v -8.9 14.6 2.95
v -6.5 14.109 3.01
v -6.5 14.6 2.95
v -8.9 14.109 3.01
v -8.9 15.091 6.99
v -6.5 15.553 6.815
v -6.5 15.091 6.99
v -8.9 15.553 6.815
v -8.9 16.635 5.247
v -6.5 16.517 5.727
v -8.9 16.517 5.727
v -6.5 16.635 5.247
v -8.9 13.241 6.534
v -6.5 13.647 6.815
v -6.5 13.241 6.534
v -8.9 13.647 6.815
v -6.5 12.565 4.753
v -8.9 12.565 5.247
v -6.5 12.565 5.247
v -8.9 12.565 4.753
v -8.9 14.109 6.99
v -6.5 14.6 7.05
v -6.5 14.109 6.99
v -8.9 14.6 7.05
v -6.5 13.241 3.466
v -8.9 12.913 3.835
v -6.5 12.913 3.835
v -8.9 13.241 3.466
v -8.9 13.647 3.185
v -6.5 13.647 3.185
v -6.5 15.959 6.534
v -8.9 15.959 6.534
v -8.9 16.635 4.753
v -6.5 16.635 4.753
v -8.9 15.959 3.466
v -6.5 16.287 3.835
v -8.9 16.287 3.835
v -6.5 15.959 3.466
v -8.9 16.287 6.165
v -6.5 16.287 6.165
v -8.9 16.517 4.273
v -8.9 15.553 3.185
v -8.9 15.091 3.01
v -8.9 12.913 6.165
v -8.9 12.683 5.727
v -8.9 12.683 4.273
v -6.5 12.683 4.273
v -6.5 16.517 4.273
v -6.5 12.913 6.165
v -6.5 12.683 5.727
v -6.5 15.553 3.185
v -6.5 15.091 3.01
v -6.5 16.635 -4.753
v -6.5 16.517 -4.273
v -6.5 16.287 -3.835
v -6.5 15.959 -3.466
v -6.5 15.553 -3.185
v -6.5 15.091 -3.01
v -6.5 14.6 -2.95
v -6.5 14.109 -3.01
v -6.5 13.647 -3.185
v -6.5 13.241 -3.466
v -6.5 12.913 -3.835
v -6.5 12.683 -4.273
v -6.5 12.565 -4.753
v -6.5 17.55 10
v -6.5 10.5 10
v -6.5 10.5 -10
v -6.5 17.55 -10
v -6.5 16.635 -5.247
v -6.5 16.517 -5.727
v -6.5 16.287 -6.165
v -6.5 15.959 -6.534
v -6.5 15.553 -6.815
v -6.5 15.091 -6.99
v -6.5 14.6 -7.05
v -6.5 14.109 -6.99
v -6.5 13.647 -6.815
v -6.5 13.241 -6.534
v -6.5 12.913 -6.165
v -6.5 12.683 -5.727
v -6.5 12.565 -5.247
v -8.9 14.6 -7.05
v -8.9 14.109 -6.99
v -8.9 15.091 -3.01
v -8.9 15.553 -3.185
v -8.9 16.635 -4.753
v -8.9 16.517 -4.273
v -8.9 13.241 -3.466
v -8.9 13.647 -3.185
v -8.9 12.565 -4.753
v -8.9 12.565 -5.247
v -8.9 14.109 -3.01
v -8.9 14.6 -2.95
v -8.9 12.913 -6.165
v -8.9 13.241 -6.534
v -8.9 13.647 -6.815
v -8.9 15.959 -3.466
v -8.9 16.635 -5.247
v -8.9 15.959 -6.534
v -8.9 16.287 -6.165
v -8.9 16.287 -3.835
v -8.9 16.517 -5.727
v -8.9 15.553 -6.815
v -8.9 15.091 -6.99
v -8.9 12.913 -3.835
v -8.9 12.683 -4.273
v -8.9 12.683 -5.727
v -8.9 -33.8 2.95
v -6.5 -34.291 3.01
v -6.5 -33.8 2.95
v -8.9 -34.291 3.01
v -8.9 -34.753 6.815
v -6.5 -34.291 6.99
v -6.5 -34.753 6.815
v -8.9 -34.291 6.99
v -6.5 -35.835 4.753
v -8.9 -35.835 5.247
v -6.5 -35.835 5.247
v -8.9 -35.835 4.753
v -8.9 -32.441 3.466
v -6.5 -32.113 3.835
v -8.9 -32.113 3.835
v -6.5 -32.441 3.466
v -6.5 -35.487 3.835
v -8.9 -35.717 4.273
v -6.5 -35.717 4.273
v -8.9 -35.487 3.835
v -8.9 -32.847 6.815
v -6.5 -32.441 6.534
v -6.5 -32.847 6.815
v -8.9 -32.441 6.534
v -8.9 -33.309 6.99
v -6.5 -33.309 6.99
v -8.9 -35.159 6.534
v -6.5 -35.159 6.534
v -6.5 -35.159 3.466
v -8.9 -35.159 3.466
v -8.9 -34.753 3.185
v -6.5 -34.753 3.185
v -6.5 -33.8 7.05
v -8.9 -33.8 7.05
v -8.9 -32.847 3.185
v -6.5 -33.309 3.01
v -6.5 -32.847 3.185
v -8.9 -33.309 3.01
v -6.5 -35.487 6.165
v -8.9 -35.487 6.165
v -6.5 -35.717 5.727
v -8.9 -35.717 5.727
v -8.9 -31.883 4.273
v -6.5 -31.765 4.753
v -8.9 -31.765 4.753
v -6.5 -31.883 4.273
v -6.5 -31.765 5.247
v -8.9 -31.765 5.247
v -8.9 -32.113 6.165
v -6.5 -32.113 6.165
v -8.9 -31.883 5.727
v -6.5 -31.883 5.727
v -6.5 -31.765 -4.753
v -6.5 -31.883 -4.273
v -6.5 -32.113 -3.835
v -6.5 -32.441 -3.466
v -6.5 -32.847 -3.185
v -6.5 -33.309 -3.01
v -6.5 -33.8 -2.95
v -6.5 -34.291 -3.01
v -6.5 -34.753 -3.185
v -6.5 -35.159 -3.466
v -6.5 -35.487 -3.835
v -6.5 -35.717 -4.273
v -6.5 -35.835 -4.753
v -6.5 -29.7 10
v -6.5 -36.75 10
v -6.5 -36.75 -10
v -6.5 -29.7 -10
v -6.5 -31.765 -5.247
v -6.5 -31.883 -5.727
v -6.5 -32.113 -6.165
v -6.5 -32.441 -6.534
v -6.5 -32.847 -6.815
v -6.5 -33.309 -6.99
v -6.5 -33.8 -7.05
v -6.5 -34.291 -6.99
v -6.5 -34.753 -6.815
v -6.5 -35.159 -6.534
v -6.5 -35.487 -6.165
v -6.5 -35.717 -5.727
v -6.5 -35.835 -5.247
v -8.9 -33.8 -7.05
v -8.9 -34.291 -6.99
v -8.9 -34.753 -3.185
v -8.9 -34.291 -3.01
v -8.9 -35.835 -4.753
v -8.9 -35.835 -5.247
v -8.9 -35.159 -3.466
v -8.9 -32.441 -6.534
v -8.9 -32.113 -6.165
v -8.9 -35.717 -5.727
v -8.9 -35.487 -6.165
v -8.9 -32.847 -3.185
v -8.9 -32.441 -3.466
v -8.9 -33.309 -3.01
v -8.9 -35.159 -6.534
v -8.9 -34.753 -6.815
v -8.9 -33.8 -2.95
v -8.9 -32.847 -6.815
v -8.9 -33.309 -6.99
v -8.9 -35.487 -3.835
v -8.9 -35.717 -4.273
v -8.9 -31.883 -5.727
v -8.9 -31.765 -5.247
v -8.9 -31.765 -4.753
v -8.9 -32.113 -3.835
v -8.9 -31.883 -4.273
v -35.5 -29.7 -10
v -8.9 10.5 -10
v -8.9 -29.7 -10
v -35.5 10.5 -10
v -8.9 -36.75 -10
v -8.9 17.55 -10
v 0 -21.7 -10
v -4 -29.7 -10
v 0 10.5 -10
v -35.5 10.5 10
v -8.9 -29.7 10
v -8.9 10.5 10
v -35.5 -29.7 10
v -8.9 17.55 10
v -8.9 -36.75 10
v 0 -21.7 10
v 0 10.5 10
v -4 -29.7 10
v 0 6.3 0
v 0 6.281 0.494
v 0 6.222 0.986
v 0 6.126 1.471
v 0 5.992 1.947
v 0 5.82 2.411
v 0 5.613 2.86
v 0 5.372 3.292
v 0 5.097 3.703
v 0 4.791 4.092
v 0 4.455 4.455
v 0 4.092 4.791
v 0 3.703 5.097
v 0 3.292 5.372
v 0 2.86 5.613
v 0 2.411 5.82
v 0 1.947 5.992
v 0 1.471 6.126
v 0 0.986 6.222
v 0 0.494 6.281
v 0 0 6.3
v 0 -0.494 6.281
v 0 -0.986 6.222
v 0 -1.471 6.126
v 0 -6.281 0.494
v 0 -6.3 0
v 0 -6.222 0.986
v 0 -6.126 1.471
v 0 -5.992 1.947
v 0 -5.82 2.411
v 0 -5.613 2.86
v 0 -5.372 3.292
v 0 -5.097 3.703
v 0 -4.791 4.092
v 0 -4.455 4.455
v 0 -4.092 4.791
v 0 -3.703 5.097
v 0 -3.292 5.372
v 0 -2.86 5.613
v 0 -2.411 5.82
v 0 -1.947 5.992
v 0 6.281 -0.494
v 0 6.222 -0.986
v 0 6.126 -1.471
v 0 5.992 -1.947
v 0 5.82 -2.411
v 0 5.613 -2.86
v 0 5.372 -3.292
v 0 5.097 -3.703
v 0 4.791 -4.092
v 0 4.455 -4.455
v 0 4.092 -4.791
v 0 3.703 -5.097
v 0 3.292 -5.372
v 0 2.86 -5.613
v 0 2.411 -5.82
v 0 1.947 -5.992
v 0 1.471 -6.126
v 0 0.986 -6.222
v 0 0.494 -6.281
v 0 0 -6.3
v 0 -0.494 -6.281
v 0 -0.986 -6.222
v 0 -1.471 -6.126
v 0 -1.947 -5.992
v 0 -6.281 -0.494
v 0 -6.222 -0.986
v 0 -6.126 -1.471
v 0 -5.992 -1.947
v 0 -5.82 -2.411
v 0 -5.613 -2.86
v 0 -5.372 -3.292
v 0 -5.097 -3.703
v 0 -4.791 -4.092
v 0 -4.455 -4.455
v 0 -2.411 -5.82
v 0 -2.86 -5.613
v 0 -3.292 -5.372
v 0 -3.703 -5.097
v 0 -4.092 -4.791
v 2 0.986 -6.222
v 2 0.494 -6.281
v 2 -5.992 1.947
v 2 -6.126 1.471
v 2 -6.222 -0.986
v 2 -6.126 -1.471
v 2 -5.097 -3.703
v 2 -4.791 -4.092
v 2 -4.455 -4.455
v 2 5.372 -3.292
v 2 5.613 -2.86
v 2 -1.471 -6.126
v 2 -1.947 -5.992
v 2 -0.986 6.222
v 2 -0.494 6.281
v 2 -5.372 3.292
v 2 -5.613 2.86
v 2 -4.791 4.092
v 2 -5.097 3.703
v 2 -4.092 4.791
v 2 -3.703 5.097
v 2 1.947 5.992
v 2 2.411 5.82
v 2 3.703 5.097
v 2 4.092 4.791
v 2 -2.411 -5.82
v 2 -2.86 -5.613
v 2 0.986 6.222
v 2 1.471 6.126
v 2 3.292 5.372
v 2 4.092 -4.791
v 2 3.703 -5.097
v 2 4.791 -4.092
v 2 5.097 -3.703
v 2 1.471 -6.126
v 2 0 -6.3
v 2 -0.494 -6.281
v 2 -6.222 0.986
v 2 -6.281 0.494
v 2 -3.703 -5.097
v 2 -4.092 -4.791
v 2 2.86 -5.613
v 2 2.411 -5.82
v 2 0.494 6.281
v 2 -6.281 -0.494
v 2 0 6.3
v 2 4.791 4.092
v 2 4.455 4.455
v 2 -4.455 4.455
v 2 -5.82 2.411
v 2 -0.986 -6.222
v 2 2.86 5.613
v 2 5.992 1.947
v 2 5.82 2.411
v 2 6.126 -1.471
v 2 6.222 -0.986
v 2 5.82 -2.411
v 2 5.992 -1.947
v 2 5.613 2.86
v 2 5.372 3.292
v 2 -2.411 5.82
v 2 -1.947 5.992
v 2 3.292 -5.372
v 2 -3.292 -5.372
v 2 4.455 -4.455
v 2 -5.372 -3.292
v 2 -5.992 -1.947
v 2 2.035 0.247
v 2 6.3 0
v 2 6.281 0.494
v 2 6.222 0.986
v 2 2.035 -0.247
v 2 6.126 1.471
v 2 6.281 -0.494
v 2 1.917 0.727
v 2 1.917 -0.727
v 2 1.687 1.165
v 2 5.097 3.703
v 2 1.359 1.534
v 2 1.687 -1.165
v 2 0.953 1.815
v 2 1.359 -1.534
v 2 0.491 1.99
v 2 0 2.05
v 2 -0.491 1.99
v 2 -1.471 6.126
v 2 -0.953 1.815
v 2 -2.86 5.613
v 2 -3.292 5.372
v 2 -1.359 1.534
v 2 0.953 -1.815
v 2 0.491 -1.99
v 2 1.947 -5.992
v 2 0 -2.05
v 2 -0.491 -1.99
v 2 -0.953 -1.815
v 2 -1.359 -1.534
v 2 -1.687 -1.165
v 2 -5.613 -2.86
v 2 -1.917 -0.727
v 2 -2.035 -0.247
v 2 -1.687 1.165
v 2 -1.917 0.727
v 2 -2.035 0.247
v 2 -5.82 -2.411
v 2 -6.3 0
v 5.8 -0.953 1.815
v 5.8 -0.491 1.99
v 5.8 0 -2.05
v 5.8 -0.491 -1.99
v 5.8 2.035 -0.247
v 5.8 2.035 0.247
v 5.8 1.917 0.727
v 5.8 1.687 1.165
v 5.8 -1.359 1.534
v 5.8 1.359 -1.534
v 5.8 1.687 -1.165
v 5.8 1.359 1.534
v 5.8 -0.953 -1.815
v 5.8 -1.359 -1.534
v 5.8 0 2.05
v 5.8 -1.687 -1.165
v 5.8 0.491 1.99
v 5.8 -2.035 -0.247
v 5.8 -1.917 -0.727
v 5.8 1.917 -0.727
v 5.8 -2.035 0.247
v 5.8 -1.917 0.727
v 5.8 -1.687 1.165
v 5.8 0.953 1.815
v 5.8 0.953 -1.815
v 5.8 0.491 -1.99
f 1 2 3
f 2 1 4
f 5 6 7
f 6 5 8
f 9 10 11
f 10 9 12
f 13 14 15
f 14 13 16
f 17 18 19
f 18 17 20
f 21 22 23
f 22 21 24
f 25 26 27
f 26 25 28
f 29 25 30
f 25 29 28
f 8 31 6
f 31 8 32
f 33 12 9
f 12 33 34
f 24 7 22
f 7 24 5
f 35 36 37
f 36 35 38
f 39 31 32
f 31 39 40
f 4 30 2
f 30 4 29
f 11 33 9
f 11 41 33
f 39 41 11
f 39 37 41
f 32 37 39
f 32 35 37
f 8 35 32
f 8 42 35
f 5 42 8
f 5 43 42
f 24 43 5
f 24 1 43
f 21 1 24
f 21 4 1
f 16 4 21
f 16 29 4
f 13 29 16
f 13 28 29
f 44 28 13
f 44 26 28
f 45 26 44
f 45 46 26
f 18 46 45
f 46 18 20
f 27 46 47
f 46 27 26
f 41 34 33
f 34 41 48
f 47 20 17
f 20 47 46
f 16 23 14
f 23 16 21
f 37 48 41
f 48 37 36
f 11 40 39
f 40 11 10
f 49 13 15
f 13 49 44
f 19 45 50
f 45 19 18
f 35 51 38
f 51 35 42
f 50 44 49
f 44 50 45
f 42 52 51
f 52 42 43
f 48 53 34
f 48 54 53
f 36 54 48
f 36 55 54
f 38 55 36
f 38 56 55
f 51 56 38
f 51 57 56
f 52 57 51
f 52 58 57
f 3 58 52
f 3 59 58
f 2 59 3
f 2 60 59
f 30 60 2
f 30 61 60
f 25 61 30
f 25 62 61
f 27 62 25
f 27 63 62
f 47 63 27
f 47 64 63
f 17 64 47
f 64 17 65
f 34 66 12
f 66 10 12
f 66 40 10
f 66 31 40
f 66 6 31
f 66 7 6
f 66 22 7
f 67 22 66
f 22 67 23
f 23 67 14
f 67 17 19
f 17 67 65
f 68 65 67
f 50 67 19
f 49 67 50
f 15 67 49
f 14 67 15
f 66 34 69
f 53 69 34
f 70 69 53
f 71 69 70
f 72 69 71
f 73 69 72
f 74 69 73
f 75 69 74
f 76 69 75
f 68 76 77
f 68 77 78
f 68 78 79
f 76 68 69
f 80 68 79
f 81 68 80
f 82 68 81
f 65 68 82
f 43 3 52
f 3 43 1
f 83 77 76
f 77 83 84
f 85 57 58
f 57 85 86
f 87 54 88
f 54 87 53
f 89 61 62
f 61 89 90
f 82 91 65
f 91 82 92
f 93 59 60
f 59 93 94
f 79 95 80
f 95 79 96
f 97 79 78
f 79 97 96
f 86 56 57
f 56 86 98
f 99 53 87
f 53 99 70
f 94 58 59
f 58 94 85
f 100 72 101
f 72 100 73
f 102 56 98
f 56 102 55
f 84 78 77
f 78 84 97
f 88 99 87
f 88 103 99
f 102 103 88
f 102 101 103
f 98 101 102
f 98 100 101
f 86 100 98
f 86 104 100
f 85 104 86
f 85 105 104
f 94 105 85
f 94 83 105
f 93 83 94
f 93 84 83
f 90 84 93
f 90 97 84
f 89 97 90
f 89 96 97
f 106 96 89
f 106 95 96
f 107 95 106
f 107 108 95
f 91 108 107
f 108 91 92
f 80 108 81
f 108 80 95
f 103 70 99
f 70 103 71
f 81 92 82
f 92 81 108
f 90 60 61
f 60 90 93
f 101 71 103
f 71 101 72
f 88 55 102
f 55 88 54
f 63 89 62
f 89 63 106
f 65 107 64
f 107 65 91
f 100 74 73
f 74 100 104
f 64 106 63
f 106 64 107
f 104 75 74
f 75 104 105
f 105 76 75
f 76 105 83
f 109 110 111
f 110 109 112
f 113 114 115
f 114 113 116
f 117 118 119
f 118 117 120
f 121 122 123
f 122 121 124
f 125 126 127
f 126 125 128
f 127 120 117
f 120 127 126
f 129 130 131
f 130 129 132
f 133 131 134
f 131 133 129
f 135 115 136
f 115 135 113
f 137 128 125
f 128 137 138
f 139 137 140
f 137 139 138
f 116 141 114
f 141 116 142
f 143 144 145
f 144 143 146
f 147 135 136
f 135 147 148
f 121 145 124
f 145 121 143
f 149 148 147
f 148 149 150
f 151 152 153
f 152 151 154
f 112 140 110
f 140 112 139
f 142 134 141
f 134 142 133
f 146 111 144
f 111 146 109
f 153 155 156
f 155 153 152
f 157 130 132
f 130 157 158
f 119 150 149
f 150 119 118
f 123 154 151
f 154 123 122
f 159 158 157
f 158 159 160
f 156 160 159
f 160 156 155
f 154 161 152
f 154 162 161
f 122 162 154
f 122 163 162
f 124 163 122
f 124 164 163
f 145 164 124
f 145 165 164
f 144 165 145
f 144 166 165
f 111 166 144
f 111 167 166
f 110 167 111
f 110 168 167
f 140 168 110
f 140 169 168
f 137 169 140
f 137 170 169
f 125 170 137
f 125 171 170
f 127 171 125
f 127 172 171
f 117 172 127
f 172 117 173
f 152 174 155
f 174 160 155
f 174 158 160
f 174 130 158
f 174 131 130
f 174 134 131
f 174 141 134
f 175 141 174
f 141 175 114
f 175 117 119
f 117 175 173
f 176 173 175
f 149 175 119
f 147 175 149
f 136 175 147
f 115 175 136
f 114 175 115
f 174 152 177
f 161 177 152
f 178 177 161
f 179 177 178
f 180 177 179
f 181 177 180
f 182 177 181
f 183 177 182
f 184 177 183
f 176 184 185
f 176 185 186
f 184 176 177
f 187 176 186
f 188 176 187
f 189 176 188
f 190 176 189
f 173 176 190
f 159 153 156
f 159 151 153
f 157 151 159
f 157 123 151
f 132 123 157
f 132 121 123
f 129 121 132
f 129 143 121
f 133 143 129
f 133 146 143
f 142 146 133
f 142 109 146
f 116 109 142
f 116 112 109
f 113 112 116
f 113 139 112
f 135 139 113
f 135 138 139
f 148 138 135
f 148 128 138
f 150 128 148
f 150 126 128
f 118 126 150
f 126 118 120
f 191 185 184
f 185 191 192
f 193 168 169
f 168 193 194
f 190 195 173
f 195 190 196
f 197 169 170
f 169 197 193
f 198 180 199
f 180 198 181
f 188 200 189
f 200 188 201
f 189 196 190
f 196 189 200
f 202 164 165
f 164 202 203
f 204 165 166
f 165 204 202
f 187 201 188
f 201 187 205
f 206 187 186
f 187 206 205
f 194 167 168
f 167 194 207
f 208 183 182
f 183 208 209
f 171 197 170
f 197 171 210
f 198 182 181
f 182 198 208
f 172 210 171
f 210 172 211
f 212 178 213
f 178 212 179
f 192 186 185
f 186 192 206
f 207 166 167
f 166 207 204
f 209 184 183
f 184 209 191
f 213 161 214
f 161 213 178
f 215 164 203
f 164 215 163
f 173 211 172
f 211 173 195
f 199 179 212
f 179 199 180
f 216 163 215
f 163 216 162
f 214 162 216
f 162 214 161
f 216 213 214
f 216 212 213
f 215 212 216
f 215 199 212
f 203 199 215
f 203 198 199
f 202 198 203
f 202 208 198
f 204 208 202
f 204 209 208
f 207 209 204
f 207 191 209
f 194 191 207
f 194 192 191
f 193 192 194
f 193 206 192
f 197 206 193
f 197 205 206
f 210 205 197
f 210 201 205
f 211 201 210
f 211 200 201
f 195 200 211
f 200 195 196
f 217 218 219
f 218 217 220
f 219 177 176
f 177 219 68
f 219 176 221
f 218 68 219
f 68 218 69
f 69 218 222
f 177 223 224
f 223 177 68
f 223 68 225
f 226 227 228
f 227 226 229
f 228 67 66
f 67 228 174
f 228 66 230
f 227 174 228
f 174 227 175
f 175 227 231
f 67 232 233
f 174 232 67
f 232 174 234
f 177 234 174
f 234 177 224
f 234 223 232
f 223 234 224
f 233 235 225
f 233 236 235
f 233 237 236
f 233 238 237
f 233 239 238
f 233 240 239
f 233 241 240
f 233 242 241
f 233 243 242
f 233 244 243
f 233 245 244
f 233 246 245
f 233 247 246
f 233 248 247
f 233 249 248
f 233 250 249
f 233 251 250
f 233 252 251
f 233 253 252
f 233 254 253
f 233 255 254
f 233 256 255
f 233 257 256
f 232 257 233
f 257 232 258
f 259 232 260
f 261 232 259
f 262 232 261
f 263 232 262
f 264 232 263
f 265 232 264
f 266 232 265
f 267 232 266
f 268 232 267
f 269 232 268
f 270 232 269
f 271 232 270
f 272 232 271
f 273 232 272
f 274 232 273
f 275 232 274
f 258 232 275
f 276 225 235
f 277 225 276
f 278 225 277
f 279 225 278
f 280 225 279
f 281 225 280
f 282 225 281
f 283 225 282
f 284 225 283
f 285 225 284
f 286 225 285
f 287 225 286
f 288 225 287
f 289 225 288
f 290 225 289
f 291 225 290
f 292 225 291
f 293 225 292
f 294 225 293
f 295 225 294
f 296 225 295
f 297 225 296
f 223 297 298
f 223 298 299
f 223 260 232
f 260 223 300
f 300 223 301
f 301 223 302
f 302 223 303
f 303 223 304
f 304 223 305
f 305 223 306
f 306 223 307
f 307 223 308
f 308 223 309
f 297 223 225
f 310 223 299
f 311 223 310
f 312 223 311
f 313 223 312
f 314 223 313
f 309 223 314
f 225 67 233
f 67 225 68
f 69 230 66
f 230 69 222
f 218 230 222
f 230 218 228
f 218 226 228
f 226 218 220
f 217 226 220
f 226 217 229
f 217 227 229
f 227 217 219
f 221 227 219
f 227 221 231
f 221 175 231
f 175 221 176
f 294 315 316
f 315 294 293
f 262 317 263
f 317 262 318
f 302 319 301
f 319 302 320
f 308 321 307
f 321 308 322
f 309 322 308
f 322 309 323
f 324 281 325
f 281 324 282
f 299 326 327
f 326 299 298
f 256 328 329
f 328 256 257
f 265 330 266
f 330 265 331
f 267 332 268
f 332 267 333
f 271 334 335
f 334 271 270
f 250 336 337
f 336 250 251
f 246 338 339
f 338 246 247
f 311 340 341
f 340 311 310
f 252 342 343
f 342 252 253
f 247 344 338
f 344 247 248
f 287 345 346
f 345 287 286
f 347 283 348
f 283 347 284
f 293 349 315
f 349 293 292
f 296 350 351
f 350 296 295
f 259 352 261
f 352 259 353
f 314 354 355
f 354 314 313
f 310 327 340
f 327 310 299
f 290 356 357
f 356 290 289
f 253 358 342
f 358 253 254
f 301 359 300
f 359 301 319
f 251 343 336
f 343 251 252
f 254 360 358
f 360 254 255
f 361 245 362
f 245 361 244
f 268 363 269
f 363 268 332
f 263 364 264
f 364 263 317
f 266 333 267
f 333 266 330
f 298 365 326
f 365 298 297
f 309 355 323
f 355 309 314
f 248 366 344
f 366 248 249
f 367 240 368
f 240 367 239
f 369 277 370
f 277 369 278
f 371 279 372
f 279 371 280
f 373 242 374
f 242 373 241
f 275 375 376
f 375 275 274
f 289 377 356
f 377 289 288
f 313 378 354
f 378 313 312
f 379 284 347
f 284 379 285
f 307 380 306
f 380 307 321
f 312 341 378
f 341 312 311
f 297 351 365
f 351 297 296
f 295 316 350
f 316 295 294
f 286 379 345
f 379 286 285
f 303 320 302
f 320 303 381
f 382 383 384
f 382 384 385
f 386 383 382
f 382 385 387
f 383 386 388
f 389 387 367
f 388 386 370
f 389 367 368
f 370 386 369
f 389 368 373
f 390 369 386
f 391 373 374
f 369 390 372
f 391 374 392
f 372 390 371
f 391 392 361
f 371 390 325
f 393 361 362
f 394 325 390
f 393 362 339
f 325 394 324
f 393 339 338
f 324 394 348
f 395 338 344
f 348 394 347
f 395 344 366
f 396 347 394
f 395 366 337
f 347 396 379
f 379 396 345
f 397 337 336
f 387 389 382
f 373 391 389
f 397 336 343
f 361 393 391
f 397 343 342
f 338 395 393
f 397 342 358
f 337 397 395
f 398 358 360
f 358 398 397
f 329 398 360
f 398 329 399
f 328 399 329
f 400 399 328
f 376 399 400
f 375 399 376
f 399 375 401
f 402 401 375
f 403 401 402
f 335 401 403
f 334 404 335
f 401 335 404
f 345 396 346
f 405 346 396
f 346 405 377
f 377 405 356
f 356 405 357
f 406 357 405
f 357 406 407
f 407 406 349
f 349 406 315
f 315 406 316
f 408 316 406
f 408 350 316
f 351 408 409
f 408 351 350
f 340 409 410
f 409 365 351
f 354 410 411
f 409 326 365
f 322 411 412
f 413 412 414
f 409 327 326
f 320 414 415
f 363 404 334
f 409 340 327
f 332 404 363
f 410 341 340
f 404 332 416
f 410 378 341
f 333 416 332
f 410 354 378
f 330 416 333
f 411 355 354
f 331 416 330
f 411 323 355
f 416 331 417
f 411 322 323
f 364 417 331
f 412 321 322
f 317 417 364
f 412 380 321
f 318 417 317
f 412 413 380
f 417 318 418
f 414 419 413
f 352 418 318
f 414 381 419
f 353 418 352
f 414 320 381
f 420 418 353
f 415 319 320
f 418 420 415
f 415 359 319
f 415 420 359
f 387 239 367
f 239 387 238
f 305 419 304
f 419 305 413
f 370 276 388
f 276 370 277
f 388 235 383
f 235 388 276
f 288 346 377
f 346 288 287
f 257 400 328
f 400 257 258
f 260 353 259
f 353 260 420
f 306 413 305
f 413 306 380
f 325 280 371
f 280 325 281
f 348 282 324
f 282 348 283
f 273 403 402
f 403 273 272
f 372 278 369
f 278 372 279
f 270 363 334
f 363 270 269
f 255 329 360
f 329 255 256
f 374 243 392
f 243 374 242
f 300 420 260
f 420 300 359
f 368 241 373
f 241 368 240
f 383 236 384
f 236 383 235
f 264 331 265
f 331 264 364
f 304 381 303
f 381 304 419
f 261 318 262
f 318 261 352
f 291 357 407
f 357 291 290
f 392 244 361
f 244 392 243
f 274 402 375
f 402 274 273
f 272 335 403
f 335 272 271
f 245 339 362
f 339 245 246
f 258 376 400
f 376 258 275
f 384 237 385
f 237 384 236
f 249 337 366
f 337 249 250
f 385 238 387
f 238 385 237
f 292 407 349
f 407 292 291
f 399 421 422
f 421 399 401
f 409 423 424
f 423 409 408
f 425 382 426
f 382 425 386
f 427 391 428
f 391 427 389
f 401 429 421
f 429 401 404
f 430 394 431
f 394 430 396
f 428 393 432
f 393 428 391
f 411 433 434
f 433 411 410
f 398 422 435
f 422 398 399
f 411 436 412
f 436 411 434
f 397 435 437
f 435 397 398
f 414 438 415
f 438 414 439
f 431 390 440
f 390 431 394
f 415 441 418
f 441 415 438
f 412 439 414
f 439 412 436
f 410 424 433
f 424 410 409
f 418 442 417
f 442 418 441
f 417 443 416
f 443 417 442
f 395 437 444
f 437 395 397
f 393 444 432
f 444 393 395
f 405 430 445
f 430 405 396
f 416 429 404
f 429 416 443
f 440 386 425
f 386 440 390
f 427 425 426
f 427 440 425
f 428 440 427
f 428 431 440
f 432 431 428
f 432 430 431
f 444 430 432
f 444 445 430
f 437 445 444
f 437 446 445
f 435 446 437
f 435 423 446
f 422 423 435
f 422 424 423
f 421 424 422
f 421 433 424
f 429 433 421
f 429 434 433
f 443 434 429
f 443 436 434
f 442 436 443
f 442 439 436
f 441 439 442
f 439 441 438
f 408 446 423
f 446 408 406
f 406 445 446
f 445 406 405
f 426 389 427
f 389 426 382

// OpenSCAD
//Use polygon and linear extrude
//The origin is placed at the root of the axel in XY


//HS422 dimensions measured with caliper
//X axis
//Total height of case from base to top of gearbox
Lx_case = 35.5;
//Measure from base to top of bearing of axel
Lx_case_to_bearing = 37.5;
//Add total height with axel
Lx_case_and_axel = 41.3;
//Height of the flanges
Lx_flange_thickness = 2.4;

//Measure position of the flanges from bottom and top
Lx_base_to_flange = 29.5;
Lx_flange_to_top = 9.4;


//Length of the cable stub tot attach to the model
Lx_length_cable = 10.0;

//Lx_butt = (16.4+0.0);
//Lx_body_flange_gearbox = 23.0;


//Y axis
Ly_butt = 40.2;
//Distance between holes measured from the inside, need to add diameter
Ly_hole_interaxis_inner = 44.3;
Ly_flange = 54.3;
Ly_height_cable = 3.0;
//How much a flange extends from the body
Ly_flange_extends = (Ly_flange-Ly_butt)/2;
//Axel offset from top of servo
Ly_top_to_axel = 10.5;

//Z axis
Lz_depth = 20.0;
//I have four holes in a 2X2 configuration, this is vertical stacking
Lz_hole_interaxis = 10.0;

Lz_width_cable = 8.0;

//There is an indent on the bottom side of the gearbox, it's very servo dependent
Lr_indent = 8.0;

//Lz_depth_gearbox = 4.3;
//Diameters
//Holes in the flange
D_hole_diameter = 4.1;
//Servo Axel
D_axel = 5.9;
//Diameter of the bearing at the base of the axel
D_bearing = 12.6;

//Position of the flange from the base
Lx_flange_base = (Lx_base_to_flange -Lx_flange_thickness)/2 + (Lx_case -Lx_flange_to_top)/2;


Ly_hole_interaxis = Ly_hole_interaxis_inner +D_hole_diameter; 

module HS422()
{
	//Create the outline of the base
	aan_points =
	[
		//Top left corner
        [0, 0],
		//Top flange
        [Lx_flange_base, 0],
		[Lx_flange_base, Ly_flange_extends],
		[Lx_flange_base+Lx_flange_thickness, Ly_flange_extends],
		[Lx_flange_base+Lx_flange_thickness, 0],
		//Top right corner
		[Lx_case, 0],
		//Bottom right corner and indent
		[Lx_case, -Ly_butt+Lr_indent],
		[Lx_case-Lr_indent/2, -Ly_butt],
		//Bottom Flange
		[Lx_flange_base+Lx_flange_thickness, -Ly_butt],
		[Lx_flange_base+Lx_flange_thickness, -Ly_butt-Ly_flange_extends],
		[Lx_flange_base, -Ly_butt-Ly_flange_extends],
		[Lx_flange_base, -Ly_butt],
		//Bottom left corner
		[0, -Ly_butt],
    ];
	//Build the geometry, translate it so the axel is in the origin
	translate([-Lx_case,Ly_top_to_axel,-Lz_depth/2])
	color("gray")
	difference()
	{
		union()
		{
			linear_extrude(Lz_depth)
				polygon(aan_points);
		}
		union()
		{
			//Top Top hole
			translate([Lx_flange_base,(Ly_hole_interaxis-Ly_butt)/2,Lz_depth/2+Lz_hole_interaxis/2])
			rotate([0,90,0])
			linear_extrude(Lx_flange_thickness)
			circle(d=D_hole_diameter,$fa=0.5,$fs=0.5);
			//Top Bottom hole
			translate([Lx_flange_base,(Ly_hole_interaxis-Ly_butt)/2,Lz_depth/2-Lz_hole_interaxis/2])
			rotate([0,90,0])
			linear_extrude(Lx_flange_thickness)
			circle(d=D_hole_diameter,$fa=0.5,$fs=0.5);

			//Bottom Top Hole
			translate([Lx_flange_base,-Ly_hole_interaxis+(Ly_hole_interaxis-Ly_butt)/2,Lz_depth/2+Lz_hole_interaxis/2])
			rotate([0,90,0])
			linear_extrude(Lx_flange_thickness)
			circle(d=D_hole_diameter,$fa=0.5,$fs=0.5);
			//Bottom Bottom Hole
			translate([Lx_flange_base,-Ly_hole_interaxis+(Ly_hole_interaxis-Ly_butt)/2,Lz_depth/2-Lz_hole_interaxis/2])
			rotate([0,90,0])
			linear_extrude(Lx_flange_thickness)
			circle(d=D_hole_diameter,$fa=0.5,$fs=0.5);

		}
	}
	//add servo bearing at base of axel

	//Add servo axel in the origin
	color("red")
	rotate([0,90,0])
	linear_extrude(Lx_case_to_bearing-Lx_case)
	circle(d=D_bearing,$fa=0.5,$fs=0.5);


	//Add servo axel in the origin
	color("red")
	rotate([0,90,0])
	linear_extrude(Lx_case_and_axel-Lx_case)
	circle(d=D_hole_diameter,$fa=0.5,$fs=0.5);
}


//Show the model
HS422();
